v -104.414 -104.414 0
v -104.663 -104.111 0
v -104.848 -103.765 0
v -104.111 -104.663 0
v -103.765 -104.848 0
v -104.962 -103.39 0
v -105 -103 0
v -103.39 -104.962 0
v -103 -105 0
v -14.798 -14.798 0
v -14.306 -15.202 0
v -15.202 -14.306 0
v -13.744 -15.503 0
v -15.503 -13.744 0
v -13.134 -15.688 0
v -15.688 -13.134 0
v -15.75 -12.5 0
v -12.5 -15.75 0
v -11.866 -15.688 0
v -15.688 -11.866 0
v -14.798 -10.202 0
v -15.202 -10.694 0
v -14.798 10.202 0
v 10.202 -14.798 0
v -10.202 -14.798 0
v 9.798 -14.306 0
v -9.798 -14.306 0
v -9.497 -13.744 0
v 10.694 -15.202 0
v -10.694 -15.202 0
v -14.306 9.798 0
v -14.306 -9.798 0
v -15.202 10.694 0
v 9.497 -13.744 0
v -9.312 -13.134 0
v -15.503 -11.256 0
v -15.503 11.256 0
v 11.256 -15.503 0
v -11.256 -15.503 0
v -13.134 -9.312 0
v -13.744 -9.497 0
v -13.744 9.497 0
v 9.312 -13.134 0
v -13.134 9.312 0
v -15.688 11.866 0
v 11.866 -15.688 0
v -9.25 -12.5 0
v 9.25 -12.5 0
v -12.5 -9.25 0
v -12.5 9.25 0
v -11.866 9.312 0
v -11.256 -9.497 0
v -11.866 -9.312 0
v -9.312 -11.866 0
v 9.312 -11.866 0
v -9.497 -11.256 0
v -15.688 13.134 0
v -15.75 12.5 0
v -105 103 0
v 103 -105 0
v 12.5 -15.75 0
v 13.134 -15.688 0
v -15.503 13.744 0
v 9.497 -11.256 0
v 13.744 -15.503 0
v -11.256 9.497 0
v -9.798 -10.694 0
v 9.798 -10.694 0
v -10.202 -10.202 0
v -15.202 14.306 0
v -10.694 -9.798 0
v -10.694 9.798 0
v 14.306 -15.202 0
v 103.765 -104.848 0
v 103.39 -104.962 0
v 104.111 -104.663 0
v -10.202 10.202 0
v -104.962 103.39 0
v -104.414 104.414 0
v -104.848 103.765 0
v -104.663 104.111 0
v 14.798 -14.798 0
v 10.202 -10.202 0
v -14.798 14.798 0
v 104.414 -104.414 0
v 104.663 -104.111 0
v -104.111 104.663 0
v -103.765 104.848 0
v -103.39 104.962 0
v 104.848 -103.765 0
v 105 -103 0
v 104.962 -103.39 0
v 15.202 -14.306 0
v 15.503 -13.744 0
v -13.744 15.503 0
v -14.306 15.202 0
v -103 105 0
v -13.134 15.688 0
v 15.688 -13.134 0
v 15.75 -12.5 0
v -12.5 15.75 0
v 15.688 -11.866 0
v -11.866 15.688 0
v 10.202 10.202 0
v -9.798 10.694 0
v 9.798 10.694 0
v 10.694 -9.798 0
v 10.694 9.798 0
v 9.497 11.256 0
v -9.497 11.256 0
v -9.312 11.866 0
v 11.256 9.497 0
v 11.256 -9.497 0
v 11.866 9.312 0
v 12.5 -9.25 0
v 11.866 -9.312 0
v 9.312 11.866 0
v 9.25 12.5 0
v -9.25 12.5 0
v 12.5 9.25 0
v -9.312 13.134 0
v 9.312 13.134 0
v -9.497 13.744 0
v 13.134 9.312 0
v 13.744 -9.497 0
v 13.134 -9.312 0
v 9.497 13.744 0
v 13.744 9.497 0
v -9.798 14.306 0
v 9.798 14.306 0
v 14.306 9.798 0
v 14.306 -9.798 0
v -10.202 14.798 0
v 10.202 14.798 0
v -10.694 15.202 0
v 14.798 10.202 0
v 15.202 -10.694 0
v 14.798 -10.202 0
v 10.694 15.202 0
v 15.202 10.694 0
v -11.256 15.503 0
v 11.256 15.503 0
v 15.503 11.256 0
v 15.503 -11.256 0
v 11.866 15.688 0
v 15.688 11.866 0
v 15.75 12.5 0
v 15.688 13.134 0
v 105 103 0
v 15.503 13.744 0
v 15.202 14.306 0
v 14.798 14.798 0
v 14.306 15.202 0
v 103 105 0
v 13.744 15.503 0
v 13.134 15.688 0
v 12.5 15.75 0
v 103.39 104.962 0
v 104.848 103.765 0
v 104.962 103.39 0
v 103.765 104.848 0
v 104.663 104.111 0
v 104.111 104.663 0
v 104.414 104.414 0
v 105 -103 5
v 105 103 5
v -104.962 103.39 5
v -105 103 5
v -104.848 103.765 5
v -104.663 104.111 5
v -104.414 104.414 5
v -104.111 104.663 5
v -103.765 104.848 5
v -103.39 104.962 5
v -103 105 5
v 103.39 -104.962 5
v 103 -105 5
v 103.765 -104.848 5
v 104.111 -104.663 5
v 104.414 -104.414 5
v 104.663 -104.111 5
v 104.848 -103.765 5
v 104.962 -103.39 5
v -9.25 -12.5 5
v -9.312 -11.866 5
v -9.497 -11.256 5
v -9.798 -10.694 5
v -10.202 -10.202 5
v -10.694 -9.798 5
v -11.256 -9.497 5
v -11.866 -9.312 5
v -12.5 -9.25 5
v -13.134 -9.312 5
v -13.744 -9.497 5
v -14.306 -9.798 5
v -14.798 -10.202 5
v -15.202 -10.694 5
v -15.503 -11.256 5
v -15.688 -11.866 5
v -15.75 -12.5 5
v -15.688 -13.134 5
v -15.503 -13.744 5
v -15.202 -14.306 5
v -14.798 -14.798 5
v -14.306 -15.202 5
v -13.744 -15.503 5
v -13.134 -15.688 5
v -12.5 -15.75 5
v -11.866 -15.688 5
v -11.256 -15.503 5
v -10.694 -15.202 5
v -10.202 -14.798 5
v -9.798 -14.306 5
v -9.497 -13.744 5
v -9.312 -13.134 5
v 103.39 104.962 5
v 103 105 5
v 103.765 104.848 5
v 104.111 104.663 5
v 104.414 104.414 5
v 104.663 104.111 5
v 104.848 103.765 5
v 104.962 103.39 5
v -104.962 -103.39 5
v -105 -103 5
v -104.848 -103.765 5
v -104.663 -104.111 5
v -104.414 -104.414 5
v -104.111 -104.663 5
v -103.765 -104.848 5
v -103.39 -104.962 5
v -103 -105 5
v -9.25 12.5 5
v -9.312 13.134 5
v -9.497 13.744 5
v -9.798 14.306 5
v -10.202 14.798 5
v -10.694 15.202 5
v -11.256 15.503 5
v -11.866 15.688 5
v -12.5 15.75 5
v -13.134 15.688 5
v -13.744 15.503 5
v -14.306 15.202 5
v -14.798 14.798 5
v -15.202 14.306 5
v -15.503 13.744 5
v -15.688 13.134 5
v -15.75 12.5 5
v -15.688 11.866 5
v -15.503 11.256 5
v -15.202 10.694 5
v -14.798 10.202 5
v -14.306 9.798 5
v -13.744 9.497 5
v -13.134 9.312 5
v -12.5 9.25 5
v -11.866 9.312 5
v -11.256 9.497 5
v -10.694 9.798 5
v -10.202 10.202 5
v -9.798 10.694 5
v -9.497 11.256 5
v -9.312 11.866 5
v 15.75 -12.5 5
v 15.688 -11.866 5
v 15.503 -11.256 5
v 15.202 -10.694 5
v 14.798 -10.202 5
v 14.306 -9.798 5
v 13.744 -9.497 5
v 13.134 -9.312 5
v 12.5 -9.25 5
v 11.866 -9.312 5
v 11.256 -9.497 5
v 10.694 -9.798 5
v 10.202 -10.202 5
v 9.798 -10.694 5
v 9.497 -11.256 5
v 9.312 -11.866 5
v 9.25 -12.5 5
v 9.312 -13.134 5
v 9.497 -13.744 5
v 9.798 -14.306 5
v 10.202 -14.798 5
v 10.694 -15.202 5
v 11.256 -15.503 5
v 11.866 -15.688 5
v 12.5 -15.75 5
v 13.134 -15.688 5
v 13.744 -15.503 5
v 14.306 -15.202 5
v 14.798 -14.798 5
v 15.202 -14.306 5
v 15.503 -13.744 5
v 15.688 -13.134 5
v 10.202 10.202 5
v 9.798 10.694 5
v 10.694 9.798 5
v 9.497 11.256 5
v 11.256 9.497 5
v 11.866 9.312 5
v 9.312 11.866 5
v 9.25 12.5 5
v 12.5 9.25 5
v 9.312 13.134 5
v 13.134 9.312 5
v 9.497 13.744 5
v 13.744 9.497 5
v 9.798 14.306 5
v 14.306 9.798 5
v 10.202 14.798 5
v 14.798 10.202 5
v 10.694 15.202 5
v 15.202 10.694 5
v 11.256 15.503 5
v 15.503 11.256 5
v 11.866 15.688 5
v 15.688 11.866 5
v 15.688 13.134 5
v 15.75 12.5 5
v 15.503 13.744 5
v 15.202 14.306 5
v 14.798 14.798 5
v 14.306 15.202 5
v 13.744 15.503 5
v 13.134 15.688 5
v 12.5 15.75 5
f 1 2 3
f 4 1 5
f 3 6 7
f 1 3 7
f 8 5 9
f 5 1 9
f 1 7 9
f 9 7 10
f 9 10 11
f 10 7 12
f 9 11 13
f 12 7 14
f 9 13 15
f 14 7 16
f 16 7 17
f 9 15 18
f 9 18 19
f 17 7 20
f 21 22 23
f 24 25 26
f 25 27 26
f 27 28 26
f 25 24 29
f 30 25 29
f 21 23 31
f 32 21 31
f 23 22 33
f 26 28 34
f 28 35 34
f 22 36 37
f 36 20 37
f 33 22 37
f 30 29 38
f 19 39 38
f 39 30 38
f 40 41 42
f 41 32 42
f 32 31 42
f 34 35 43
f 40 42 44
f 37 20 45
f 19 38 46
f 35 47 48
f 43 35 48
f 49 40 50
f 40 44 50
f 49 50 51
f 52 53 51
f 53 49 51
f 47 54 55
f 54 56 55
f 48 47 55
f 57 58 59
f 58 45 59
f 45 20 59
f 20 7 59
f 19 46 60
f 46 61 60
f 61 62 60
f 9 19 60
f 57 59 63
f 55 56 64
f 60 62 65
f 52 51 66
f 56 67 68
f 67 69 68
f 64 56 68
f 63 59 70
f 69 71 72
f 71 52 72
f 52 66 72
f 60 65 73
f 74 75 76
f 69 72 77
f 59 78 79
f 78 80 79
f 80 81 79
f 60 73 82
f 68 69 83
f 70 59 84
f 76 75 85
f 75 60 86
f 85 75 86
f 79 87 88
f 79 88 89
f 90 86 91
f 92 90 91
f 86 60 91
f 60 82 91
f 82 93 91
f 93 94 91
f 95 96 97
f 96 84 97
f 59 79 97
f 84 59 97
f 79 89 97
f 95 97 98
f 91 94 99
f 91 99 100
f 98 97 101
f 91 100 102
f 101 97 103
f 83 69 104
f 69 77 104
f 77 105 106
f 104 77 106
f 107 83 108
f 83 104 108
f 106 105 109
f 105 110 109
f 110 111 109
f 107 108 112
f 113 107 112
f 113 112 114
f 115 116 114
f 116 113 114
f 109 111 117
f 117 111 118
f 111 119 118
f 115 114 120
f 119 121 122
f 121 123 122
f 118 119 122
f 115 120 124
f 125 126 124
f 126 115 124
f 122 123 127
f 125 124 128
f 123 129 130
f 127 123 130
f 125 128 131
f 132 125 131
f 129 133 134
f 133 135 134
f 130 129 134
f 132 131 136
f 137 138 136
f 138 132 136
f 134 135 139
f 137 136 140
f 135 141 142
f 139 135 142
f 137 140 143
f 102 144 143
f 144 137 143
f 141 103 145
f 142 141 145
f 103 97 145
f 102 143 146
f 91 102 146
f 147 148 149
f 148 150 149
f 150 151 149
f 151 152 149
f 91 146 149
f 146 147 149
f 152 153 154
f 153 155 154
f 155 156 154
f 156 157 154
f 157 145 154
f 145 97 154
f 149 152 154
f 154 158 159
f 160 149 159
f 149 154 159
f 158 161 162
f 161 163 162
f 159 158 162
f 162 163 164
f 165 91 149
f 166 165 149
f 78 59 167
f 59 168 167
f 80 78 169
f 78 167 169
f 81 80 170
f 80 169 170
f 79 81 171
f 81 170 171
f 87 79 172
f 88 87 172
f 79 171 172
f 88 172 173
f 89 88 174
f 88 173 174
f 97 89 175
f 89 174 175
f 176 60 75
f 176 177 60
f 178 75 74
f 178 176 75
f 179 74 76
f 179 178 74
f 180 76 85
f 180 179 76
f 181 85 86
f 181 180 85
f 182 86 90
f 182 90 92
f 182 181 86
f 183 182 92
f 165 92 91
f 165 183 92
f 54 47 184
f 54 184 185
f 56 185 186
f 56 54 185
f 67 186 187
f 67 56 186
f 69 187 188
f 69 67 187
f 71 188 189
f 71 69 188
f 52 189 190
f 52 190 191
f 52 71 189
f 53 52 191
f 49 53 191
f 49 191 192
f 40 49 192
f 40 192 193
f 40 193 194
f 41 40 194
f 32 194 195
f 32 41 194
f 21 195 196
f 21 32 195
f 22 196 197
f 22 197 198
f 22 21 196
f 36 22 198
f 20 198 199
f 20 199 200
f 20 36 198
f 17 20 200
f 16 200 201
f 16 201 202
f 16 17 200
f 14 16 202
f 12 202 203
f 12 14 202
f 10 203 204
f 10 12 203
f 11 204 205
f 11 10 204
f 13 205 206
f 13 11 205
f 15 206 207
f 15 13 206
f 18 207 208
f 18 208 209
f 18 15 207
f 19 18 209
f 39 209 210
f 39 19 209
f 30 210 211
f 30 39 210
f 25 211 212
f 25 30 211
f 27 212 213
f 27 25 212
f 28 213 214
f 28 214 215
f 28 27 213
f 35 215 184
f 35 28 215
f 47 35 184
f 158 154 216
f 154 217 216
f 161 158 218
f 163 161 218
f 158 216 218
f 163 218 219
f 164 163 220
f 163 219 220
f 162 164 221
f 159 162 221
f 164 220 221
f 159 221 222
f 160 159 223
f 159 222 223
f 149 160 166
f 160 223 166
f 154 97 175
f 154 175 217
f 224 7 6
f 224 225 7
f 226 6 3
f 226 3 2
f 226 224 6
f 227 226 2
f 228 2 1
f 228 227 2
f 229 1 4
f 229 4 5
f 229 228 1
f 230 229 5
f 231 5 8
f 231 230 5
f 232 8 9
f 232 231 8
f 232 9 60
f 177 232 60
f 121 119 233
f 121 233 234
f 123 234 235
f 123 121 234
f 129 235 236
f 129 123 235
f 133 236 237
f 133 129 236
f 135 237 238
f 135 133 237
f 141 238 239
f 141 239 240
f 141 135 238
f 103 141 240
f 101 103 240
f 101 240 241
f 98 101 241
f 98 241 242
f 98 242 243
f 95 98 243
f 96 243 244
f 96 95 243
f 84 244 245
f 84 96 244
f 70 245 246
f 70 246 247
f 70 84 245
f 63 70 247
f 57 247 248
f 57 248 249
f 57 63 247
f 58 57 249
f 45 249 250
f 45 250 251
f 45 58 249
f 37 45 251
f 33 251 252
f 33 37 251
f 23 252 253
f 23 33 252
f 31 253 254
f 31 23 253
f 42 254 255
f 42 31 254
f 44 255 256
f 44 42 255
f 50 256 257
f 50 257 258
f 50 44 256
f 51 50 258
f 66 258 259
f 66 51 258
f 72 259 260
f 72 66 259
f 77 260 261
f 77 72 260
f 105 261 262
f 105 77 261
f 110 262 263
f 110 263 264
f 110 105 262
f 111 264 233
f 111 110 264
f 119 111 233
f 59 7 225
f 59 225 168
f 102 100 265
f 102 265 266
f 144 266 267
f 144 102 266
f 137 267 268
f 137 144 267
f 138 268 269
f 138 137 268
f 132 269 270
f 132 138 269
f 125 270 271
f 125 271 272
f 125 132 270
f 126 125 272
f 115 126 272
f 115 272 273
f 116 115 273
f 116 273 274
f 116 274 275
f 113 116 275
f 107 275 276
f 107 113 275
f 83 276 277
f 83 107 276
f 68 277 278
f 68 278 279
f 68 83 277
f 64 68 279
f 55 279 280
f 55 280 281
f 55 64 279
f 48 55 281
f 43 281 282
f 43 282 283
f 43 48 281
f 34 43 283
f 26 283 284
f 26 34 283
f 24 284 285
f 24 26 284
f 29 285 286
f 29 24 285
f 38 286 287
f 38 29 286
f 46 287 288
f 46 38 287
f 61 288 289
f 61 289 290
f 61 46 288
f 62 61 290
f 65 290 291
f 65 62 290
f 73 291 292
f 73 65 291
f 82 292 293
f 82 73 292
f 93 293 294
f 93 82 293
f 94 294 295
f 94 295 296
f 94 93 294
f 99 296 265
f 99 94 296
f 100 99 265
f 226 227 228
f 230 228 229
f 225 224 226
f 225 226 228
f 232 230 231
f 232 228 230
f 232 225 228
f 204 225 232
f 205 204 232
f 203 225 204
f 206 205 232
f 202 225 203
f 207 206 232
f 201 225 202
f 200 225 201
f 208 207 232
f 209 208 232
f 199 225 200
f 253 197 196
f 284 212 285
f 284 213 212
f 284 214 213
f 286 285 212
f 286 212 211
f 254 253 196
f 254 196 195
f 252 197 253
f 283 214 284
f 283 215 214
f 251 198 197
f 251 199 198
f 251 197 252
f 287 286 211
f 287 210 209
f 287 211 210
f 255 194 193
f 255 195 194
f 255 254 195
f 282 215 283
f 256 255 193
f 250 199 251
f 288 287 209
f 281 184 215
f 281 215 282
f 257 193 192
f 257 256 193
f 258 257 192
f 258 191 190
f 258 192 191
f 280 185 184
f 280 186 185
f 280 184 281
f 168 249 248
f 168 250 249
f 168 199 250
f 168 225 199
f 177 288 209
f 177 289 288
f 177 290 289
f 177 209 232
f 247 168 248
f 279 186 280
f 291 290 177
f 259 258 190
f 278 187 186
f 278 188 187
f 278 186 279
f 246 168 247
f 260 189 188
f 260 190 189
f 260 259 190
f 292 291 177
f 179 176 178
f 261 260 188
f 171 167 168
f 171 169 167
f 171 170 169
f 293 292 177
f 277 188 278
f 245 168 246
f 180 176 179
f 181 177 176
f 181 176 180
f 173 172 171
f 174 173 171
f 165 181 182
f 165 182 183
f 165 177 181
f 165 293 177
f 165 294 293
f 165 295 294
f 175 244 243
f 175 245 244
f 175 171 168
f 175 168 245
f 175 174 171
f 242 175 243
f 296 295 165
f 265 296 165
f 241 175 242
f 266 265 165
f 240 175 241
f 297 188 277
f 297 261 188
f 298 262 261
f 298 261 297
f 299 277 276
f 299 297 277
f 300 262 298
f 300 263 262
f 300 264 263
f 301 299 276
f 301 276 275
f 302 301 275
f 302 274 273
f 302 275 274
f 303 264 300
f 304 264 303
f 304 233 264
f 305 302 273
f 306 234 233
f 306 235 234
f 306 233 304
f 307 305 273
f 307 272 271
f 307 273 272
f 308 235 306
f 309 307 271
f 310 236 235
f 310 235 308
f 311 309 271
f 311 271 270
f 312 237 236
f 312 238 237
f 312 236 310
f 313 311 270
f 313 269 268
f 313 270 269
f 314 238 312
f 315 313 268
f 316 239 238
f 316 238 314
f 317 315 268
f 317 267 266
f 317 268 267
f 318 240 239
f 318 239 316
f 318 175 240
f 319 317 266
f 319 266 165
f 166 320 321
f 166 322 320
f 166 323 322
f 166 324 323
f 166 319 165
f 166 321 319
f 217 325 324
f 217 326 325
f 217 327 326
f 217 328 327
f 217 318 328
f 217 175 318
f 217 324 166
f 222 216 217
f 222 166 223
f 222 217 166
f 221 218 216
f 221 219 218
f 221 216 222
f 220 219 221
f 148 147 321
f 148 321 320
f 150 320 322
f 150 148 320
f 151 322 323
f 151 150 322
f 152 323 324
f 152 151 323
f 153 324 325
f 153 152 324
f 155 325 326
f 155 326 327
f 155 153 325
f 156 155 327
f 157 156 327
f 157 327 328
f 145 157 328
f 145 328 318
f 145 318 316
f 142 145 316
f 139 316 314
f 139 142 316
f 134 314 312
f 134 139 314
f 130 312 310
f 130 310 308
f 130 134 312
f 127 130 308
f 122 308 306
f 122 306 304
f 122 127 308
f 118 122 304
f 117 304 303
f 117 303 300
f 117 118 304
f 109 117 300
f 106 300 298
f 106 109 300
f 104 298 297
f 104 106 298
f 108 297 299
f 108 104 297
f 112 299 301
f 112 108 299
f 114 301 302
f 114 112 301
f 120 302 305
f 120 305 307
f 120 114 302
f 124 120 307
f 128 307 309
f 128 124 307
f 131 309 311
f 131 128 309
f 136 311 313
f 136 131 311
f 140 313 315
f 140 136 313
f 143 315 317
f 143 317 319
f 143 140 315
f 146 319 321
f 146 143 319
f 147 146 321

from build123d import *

# Parameters (mm, degrees)
CROQUIS1_W              = 210
CROQUIS1_H              = 210
CROQUIS1_R              = 3.25
SALIENTE_EXTRUIR1_DEPTH = 5
REDONDEO1_R             = 2


with BuildPart() as part:
    # Croquis1 → Saliente-Extruir1 (new body)
    with BuildSketch(Plane.XY):
        Rectangle(CROQUIS1_W, CROQUIS1_H)
        with Locations((-12.5, 12.5)):
            Circle(CROQUIS1_R, mode=Mode.SUBTRACT)
        with Locations((12.5, 12.5)):
            Circle(CROQUIS1_R, mode=Mode.SUBTRACT)
        with Locations((-12.5, -12.5)):
            Circle(CROQUIS1_R, mode=Mode.SUBTRACT)
        with Locations((12.5, -12.5)):
            Circle(CROQUIS1_R, mode=Mode.SUBTRACT)
    extrude(amount=SALIENTE_EXTRUIR1_DEPTH)

    # Redondeo1
    redondeo1_edges = [part.edges().sort_by_distance(p)[0] for p in [
        (-105, 105, 2.5),
        (105, 105, 2.5),
        (105, -105, 2.5),
        (-105, -105, 2.5),
    ]]
    fillet(redondeo1_edges, radius=REDONDEO1_R)


solid = part.part
